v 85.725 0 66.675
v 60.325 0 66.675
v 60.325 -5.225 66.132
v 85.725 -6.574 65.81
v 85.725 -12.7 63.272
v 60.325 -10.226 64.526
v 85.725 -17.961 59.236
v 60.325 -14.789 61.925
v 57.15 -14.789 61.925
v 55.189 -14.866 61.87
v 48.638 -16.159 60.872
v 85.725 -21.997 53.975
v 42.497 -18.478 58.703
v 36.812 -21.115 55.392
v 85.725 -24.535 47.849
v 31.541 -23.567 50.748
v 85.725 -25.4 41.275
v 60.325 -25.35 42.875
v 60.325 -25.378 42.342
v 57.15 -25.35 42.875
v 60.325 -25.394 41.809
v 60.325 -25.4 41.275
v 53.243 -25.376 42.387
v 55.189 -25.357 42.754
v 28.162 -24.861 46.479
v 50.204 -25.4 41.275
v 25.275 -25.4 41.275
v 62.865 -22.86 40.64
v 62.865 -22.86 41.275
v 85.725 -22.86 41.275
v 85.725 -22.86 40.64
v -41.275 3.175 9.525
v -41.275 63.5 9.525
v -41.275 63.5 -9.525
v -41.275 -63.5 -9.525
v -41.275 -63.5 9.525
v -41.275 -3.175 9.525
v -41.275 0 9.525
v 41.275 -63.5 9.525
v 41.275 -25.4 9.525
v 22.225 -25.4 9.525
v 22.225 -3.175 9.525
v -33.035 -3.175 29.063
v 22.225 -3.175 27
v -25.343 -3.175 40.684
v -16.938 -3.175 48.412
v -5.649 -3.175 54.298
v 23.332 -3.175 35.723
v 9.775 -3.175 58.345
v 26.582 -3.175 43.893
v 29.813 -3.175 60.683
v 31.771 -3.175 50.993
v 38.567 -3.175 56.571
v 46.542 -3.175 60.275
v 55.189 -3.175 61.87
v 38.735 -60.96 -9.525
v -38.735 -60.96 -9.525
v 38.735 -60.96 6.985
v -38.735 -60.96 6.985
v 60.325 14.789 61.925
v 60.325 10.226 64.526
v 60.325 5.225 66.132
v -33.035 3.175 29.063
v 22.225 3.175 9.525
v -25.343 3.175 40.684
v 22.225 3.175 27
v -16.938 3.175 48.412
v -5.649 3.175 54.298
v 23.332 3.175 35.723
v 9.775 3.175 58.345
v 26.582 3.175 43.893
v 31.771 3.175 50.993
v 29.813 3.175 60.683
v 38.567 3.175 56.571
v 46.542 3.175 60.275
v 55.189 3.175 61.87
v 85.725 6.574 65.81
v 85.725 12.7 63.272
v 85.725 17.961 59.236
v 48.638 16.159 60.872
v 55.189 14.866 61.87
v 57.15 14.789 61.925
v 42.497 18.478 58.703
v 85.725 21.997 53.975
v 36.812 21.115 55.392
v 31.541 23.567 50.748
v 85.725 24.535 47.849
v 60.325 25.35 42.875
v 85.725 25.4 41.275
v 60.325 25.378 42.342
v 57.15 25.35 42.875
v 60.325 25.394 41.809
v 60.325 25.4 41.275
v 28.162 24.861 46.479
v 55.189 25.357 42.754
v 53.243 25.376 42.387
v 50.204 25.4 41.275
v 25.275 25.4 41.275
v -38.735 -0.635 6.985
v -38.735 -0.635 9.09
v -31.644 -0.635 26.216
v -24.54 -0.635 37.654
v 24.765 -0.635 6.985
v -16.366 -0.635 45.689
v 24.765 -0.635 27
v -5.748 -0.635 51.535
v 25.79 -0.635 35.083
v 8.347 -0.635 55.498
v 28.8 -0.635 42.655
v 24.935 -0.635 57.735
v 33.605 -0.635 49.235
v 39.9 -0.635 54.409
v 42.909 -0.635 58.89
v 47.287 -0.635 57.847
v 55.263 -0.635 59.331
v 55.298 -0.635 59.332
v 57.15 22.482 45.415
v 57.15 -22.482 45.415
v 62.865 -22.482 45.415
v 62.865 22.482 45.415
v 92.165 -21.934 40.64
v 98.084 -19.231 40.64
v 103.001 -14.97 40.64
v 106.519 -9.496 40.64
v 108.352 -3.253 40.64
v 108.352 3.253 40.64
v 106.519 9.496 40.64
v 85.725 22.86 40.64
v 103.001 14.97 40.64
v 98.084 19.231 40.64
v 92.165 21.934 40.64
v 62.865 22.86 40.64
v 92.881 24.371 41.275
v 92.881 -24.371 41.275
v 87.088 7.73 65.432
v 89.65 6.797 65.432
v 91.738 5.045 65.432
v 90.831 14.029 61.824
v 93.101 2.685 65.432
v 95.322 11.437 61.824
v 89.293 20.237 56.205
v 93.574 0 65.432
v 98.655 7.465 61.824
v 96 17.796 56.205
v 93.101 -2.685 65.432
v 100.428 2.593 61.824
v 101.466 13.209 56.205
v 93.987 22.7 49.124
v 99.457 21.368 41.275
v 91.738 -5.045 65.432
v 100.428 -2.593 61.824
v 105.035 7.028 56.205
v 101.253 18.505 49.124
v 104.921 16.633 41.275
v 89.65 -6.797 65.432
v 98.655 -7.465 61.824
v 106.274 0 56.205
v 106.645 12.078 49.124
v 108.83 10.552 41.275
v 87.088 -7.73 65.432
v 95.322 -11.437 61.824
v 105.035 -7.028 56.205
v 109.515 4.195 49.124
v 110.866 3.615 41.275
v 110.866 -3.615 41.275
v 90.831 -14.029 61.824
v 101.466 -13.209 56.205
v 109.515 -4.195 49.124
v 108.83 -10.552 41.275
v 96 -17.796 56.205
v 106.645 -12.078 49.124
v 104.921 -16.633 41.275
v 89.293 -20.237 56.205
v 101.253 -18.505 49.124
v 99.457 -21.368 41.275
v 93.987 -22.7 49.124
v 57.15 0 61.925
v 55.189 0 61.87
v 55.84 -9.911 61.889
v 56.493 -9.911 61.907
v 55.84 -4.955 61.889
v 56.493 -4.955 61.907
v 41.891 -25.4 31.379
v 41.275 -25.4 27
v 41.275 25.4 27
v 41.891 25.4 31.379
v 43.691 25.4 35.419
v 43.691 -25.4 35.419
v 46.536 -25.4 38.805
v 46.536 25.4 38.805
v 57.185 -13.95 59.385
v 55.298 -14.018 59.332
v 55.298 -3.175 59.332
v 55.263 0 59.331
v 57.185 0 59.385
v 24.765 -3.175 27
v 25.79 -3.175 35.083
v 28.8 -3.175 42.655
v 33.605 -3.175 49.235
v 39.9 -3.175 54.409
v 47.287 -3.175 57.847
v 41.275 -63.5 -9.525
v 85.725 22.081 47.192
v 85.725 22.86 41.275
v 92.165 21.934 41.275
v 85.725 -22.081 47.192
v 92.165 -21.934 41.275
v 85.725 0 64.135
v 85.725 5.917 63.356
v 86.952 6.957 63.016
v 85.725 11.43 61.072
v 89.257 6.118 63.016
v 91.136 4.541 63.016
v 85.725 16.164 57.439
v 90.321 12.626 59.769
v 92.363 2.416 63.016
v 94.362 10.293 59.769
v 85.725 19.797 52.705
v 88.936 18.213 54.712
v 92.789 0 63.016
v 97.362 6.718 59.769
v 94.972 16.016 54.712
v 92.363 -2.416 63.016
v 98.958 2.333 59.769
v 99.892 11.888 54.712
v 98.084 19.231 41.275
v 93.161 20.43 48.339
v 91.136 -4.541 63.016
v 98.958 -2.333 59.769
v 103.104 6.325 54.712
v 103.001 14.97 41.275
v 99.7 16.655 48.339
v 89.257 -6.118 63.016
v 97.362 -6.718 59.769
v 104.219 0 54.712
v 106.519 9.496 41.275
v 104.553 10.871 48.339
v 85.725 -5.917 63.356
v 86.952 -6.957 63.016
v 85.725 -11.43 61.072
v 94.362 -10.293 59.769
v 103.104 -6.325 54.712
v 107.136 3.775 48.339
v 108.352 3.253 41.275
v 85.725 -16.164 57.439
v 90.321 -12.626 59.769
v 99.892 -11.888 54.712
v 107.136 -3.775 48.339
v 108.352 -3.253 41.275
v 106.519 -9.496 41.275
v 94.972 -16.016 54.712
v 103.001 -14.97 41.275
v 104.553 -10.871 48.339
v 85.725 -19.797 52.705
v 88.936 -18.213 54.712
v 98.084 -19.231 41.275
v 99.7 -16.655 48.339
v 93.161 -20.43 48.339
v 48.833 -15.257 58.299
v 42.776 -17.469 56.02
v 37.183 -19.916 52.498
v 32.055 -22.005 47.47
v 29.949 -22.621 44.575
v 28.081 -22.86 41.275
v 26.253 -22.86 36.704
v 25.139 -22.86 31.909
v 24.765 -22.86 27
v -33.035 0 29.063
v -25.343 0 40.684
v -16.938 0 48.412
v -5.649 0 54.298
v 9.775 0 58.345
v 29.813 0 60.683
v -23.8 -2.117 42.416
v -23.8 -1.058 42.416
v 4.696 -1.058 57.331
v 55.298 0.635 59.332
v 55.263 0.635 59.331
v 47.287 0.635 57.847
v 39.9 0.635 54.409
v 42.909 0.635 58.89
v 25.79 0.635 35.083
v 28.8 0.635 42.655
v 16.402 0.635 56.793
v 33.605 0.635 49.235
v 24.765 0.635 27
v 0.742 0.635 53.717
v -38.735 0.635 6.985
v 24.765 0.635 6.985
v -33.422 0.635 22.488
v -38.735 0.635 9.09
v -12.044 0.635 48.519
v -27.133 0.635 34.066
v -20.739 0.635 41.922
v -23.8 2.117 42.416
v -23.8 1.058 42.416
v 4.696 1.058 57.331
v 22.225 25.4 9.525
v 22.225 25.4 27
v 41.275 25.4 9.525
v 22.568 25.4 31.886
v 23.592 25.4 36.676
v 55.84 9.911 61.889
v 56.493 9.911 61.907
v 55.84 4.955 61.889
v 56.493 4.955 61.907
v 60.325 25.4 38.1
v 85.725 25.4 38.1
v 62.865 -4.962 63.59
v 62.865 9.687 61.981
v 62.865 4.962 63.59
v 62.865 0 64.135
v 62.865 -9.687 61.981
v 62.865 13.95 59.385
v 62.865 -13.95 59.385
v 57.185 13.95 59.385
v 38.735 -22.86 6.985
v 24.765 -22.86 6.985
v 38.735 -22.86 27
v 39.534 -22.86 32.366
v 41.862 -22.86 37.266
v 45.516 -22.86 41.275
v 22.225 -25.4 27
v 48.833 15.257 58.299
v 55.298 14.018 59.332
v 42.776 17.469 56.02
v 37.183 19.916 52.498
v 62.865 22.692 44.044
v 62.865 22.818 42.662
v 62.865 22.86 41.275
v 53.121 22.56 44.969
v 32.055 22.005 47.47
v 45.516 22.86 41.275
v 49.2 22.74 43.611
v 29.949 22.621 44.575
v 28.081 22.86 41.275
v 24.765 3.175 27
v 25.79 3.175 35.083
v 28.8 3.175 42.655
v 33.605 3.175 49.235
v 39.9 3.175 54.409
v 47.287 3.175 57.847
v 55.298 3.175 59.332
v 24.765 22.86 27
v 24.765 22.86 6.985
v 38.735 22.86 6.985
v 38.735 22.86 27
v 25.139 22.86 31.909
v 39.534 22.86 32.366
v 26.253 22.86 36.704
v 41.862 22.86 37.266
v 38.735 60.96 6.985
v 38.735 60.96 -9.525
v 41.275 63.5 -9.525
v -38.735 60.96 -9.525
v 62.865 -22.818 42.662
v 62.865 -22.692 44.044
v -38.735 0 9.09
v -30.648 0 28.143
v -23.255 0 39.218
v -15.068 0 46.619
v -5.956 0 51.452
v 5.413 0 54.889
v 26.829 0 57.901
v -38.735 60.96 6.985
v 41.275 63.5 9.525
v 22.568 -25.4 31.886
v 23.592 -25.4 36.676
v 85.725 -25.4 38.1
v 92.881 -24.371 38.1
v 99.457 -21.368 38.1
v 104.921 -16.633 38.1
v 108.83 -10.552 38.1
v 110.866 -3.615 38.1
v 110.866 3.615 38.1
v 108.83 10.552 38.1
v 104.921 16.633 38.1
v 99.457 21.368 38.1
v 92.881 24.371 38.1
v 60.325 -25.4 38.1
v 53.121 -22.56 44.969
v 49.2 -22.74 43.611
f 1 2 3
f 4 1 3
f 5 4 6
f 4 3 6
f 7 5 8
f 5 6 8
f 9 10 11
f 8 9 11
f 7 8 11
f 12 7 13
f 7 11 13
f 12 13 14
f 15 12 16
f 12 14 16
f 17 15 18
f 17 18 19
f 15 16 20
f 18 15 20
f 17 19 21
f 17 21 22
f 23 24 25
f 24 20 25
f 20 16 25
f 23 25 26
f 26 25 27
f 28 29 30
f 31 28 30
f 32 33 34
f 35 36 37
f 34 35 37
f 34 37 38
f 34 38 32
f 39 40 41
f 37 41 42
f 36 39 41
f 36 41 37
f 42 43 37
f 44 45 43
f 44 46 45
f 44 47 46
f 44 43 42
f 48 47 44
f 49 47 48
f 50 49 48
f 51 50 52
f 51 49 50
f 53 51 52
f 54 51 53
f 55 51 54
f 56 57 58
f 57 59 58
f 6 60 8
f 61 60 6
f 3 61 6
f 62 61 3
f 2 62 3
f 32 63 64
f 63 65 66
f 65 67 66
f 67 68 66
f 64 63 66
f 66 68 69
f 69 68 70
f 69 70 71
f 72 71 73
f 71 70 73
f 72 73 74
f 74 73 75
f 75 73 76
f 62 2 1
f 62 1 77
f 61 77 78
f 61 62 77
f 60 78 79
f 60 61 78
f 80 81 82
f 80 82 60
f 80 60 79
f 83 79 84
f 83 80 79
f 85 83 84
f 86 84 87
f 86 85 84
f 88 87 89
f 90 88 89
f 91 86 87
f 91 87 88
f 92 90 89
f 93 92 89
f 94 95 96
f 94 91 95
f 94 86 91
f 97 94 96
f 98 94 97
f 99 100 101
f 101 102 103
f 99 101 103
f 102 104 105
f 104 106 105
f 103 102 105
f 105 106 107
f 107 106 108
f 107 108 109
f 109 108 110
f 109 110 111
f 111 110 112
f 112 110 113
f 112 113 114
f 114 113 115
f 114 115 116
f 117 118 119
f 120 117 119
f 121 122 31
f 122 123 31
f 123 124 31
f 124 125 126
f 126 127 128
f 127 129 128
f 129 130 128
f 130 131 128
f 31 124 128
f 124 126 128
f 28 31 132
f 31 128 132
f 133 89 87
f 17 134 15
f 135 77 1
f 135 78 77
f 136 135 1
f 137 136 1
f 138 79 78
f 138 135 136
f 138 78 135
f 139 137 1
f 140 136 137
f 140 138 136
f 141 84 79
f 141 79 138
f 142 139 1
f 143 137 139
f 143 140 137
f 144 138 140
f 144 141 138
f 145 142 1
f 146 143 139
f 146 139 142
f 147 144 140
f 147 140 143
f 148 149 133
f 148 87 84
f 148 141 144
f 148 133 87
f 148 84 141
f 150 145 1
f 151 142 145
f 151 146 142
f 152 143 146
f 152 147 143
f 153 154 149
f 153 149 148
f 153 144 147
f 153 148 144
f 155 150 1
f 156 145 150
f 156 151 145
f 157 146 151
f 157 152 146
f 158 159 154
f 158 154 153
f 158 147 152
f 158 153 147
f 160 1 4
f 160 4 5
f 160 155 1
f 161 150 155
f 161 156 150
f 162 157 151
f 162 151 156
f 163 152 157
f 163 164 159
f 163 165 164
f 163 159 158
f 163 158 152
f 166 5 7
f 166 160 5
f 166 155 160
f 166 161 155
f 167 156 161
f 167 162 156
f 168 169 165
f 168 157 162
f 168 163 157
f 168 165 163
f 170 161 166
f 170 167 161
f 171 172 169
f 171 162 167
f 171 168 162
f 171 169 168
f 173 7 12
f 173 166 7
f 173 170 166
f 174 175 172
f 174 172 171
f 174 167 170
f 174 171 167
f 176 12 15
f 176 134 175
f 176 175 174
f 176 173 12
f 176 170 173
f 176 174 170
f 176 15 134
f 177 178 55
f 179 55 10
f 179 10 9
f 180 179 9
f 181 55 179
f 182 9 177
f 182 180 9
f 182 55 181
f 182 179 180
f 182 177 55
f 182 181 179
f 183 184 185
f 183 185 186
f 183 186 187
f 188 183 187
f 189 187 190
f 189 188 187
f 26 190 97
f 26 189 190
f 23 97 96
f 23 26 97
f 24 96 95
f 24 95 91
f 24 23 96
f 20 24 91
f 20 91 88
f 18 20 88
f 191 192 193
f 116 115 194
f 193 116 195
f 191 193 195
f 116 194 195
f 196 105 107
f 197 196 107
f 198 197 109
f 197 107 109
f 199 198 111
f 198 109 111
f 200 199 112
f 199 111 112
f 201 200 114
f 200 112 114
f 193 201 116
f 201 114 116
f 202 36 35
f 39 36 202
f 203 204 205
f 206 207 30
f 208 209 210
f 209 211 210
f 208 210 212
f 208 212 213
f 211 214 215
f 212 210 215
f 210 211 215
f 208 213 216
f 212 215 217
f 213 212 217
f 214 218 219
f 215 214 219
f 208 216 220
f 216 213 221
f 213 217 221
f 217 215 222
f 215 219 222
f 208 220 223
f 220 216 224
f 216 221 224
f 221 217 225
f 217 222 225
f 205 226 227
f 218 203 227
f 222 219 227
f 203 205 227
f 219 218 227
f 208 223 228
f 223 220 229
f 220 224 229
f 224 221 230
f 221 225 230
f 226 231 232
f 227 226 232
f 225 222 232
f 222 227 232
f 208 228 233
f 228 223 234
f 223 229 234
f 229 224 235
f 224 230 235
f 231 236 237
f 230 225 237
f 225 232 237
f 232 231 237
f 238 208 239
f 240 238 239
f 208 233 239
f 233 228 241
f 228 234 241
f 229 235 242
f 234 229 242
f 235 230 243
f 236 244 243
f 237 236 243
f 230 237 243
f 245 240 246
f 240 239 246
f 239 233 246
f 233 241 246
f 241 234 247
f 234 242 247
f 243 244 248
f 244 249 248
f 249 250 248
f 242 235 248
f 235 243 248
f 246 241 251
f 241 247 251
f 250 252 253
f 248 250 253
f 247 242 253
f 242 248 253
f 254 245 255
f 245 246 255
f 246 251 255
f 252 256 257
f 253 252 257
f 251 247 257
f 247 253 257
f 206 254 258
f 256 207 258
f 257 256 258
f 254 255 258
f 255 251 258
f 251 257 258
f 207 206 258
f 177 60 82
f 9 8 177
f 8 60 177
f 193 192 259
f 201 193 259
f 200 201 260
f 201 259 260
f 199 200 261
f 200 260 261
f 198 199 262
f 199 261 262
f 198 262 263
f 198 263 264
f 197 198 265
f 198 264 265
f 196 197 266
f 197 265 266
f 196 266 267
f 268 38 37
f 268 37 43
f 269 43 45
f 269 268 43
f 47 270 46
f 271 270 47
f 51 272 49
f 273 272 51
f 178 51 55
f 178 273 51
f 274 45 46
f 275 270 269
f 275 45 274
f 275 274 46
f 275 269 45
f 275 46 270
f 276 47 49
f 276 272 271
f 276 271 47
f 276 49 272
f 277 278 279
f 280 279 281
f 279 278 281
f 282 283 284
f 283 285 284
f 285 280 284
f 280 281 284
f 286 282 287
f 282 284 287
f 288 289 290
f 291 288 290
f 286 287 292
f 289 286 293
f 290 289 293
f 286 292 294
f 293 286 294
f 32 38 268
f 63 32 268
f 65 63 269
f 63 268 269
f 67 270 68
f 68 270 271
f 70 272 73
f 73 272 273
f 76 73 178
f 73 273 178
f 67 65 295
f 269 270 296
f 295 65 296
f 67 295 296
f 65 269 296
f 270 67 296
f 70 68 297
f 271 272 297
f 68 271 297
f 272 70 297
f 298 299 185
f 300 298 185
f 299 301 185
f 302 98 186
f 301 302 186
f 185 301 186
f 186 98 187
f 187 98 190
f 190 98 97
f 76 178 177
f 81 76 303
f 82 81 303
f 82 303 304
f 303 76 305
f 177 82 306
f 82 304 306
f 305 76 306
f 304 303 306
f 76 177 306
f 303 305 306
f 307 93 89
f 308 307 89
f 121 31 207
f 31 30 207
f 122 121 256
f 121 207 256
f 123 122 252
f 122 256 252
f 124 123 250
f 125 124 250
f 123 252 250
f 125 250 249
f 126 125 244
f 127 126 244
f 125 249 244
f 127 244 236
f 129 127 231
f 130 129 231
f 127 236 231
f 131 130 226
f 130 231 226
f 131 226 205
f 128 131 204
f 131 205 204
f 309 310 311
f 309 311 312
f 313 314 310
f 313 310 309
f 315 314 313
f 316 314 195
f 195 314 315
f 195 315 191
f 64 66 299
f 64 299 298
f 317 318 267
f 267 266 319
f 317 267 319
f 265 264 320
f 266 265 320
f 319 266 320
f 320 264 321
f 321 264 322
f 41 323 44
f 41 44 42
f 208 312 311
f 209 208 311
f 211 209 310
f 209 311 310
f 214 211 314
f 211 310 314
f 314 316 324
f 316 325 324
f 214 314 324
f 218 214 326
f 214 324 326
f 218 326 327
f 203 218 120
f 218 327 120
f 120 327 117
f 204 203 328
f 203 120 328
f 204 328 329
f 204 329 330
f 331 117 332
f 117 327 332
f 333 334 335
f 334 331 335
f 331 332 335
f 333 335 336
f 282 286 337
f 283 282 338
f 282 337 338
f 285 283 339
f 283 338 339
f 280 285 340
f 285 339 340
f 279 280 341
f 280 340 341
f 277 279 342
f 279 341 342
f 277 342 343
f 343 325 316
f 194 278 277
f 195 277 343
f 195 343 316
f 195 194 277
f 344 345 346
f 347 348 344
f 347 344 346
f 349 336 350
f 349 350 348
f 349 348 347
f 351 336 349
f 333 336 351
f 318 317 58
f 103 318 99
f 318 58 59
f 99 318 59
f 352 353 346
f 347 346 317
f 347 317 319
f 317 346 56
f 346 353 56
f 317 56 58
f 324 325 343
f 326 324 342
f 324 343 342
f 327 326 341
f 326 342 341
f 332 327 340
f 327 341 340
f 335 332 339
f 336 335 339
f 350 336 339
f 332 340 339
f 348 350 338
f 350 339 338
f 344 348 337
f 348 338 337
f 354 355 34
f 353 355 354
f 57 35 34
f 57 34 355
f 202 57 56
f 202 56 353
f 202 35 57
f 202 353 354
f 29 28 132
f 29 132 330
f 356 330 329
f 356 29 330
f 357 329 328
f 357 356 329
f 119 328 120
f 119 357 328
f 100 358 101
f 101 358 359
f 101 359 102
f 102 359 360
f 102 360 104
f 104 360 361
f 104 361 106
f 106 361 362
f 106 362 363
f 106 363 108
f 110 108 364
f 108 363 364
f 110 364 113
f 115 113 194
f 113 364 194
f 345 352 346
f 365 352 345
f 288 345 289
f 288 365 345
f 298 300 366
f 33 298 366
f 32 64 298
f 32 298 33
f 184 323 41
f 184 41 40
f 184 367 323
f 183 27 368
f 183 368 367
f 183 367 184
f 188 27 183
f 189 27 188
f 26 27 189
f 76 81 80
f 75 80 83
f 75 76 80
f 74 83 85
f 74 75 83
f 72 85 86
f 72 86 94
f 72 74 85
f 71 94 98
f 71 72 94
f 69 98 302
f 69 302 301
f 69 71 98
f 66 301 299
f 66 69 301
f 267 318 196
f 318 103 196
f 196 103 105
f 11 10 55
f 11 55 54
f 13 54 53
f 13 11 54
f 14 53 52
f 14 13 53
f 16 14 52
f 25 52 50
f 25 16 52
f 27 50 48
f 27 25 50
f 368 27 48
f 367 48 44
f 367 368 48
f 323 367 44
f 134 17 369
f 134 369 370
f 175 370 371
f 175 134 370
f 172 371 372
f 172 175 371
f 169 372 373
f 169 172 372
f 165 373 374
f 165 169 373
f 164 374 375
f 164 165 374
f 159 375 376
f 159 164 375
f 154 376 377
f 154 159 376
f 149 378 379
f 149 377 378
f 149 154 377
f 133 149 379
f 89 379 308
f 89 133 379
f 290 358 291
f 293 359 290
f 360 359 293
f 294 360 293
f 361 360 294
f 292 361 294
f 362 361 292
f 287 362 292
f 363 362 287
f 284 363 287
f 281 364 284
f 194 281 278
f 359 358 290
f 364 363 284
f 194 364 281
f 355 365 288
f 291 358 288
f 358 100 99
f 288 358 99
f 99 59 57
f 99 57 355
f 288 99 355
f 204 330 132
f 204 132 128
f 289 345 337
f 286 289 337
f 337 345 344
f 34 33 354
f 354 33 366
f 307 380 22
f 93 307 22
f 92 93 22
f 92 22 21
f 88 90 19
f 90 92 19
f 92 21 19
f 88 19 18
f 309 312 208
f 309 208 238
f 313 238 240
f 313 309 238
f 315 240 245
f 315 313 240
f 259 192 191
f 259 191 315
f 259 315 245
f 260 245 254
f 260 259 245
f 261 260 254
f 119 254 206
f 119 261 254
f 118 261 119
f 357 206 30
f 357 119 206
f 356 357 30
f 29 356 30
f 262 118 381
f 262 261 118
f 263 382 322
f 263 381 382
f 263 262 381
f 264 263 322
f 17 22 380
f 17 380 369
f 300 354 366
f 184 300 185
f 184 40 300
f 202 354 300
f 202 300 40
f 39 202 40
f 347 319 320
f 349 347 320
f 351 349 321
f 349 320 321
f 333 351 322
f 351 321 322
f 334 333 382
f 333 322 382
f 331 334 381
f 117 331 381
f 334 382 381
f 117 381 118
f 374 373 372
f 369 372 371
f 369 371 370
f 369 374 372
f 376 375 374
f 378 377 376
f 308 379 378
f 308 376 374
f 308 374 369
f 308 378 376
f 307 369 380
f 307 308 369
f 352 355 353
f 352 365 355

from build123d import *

# Parameters (mm, degrees)
F1_DEPTH     = 63.5
F0_W         = 25.4
F0_H         = 19.05
F0_H_2       = 4.7752
F0_H_3       = 4.7498
F2_DEPTH     = 25.4
F3_DEPTH     = 3.175
F5_T1_DEPTH  = 88.9
F5_T4_ANGLE  = 180
F6_T         = 2.54
F6_T3_DEPTH  = 24.13
F6_T5_DEPTH  = 27.305
F6_T7_DEPTH  = 68.58
F6_T9_DEPTH  = 27.305
F6_T11_DEPTH = 22.5552
F6_T13_DEPTH = 55.7790871697
F6_T15_DEPTH = 34.6589952471
F6_T18_ANGLE = 86.7817435726
F6_T20_ANGLE = 86.7817435726


# Not quite as in the source:
# - a fillet or chamfer that OpenCascade refuses, or shapes differently, is made with other operations: its cross-section is extruded or revolved along the edge and cut away or added
# - a shell that OpenCascade refuses in one call is made with other operations: the cavity is built on its own and cut out


with BuildPart() as f1:
    # F0 (on Front) → F1 (new body, symmetric)
    with BuildSketch(Plane.XZ):
        Polygon((41.275, -9.525), (41.275, 9.525), (22.225, 9.525), (-41.275, 9.525), (-41.275, -9.525), align=None)
    extrude(amount=F1_DEPTH, both=True)

    # F0 (on Front) → F2 (join, symmetric)
    with BuildSketch(Plane.XZ):
        with BuildLine():
            Line((22.225, 9.525), (41.275, 9.525))
            Line((41.275, 9.525), (41.275, 27.0002))
            ThreePointArc((41.275, 27.0002), (45.9246798487, 38.2255201513), (57.15, 42.8752))
            Line((57.15, 42.8752), (60.325, 42.8752))
            Line((60.325, 42.8752), (60.325, 61.9252))
            Line((60.325, 61.9252), (57.15, 61.9252))
            add(Edge.make_bspline(
                [(55.1893230691, 61.8701207193), (55.8379631981, 61.8888818572), (56.4915059272, 61.9072303668), (57.15, 61.9252)],
                knots=[110.4053566359, 110.4053566359, 110.4053566359, 110.4053566359, 111.5045361635, 111.5045361635, 111.5045361635, 111.5045361635], degree=3))
            ThreePointArc((55.1893230691, 61.8701207193), (31.7705568736, 50.9926882326), (22.225, 27.0002))
            Line((22.225, 27.0002), (22.225, 9.525))
        make_face()
        with Locations((73.025, 52.4002)):
            Rectangle(F0_W, F0_H)
        with Locations((73.025, 40.4876)):
            Rectangle(F0_W, F0_H_2)
        with Locations((73.025, 64.3001)):
            Rectangle(F0_W, F0_H_3)
    extrude(amount=F2_DEPTH, both=True)

    # F0 (on Front) → F3 (join, symmetric)
    with BuildSketch(Plane.XZ):
        with BuildLine():
            Line((-41.275, 9.525), (22.225, 9.525))
            Line((22.225, 9.525), (22.225, 27.0002))
            ThreePointArc((22.225, 27.0002), (31.7705568736, 50.9926882326), (55.1893230691, 61.8701207193))
            add(Edge.make_bspline(
                [(-41.275, 9.525), (-25.6521962788, 53.9382967597), (-9.9623131958, 59.9856877717), (55.1893230691, 61.8701207193)],
                knots=[0, 0, 0, 0, 110.4053566359, 110.4053566359, 110.4053566359, 110.4053566359], degree=3))
        make_face()
    extrude(amount=F3_DEPTH, both=True)

    # F0 (on Front) → F4 (revolve)
    with BuildSketch(Plane.XZ):
        Polygon((85.725, 61.9252), (85.725, 42.8752), (85.725, 38.1), (111.125, 38.1), (111.125, 66.675), (85.725, 66.675), align=None)
    revolve(axis=Axis((85.725, 0, 52.3875), (0, 0, 1)))

    # F5: fillet of radius 25.4 on 1 edges, made by hand

    # F5_s2 → F5_t1 (cut)
    with BuildSketch(Plane.YZ.offset(-3.175)):
        with BuildLine():
            ThreePointArc((0, 66.675), (17.9605122421, 59.2355122421), (25.4, 41.275))
            Line((25.4, 41.275), (25.4, 66.675))
            Line((25.4, 66.675), (0, 66.675))
        make_face()
        with BuildLine():
            ThreePointArc((0, 66.675), (-17.9605122421, 59.2355122421), (-25.4, 41.275))
            Line((-25.4, 41.275), (-25.4, 66.675))
            Line((-25.4, 66.675), (0, 66.675))
        make_face()
    extrude(amount=F5_T1_DEPTH, mode=Mode.SUBTRACT)

    # F5_s3 → F5_t4 (revolve, cut)
    with BuildSketch(Plane.YZ.offset(85.725)):
        with BuildLine():
            ThreePointArc((0, 66.675), (17.9605122421, 59.2355122421), (25.4, 41.275))
            Line((25.4, 41.275), (25.4, 66.675))
            Line((25.4, 66.675), (0, 66.675))
        make_face()
    revolve(axis=Axis((85.725, 0, 66.675), (0, 0, -1)), revolution_arc=F5_T4_ANGLE, mode=Mode.SUBTRACT)

    # F6: shell of thickness 2.54, made by hand


with BuildPart() as f6_core1:
    # F6_t2: copy of F1
    add(f1.part)

    # the walls: a layer under each face that stays
    f6_faces = [f6_core1.faces().sort_by_distance(p)[0] for p in [
        (41.275, 0, 8.7376),
        (0, 63.5, 0),
        (0, 33.3375, 9.525),
        (36.214543408, 25.4, 25.4),
        (45.9246798487, 0, 38.2255201513),
        (36.214543408, -25.4, 25.4),
        (0, -33.3375, 9.525),
        (0, -63.5, 0),
        (-41.275, 0, 0),
        (22.225, 14.2875, 18.2626),
        (6.9571615345, 3.175, 35.6975603597),
        (31.7705568736, 14.2875, 50.9926882326),
        (55.5002346295, 17.9605122421, 59.2355122421),
        (55.5002346295, -17.9605122421, 59.2355122421),
        (58.7375, 0, 42.8752),
        (31.7705568736, -14.2875, 50.9926882326),
        (22.225, -14.2875, 18.2626),
        (6.9571615345, -3.175, 35.6975603597),
        (-11.6161506693, 1.5875, 51.6458842892),
        (-11.6161506693, -1.5875, 51.6458842892),
        (56.1659663056, 7.4330512334, 61.8979571739),
        (60.325, 0, 64.3001),
        (58.7375, 0, 61.9252),
        (60.325, 0, 40.4876),
        (73.025, 25.4, 39.6875),
        (103.6855122422, -1e-10, 59.2355122421),
        (56.1659663056, -7.4330512334, 61.8979571739),
        (73.025, -25.4, 39.6875),
        (85.725, 0, 38.1),
        (111.125, 0, 39.6875),
    ]]
    thicken(f6_faces, amount=-F6_T, mode=Mode.SUBTRACT)

    # F6_s4 → F6_t3 (cut)
    with BuildSketch(Plane.YZ.offset(19.685)):
        Polygon((25.4254, 9.5504), (25.4, 6.985), (22.86, 6.985), (22.86, 9.525), align=None)
        Polygon((-25.4254, 9.5504), (-22.86, 9.525), (-22.86, 6.985), (-25.4, 6.985), align=None)
    extrude(amount=F6_T3_DEPTH, mode=Mode.SUBTRACT)

    # F6_s6 → F6_t5 (cut)
    with BuildSketch(Plane.XZ.offset(-27.94)):
        Polygon((22.1996, 9.5504), (22.225, 6.985), (24.765, 6.985), (24.765, 9.525), align=None)
    extrude(amount=F6_T5_DEPTH, mode=Mode.SUBTRACT)

    # F6_s8 → F6_t7 (cut)
    with BuildSketch(Plane.YZ.offset(-43.815)):
        Polygon((3.2004, 9.5504), (3.175, 6.985), (0.635, 6.985), (0.635, 9.525), align=None)
        Polygon((-3.2004, 9.5504), (-3.175, 6.985), (-0.635, 6.985), (-0.635, 9.525), align=None)
    extrude(amount=F6_T7_DEPTH, mode=Mode.SUBTRACT)

    # F6_s10 → F6_t9 (cut)
    with BuildSketch(Plane.XZ.offset(0.635)):
        Polygon((22.1996, 9.5504), (22.225, 6.985), (24.765, 6.985), (24.765, 9.525), align=None)
    extrude(amount=F6_T9_DEPTH, mode=Mode.SUBTRACT)

    # F6_s12 → F6_t11 (cut)
    with BuildSketch(Plane.XY.offset(6.985)):
        Polygon((22.1996, 3.2004), (24.765, 3.175), (24.765, 0.635), (22.225, 0.635), align=None)
        Polygon((22.1996, -3.2004), (24.765, -3.175), (24.765, -0.635), (22.225, -0.635), align=None)
    extrude(amount=F6_T11_DEPTH, mode=Mode.SUBTRACT)

    # F6_s14 → F6_t13 (cut)
    with BuildSketch(Plane.XZ.offset(-27.8895435848)):
        Polygon((60.2996, 42.8498), (60.325, 45.4152), (62.865, 45.4152), (62.865, 42.8752), align=None)
    extrude(amount=F6_T13_DEPTH, mode=Mode.SUBTRACT)

    # F6_s16 → F6_t15 (cut)
    with BuildSketch(Plane.XZ.offset(-17.3294976236)):
        Polygon((60.2996, 61.9506), (62.865, 61.9252), (62.865, 59.3852), (60.325, 59.3852), align=None)
    extrude(amount=F6_T15_DEPTH, mode=Mode.SUBTRACT)

    # F6_s17 → F6_t18 (revolve, cut)
    with BuildSketch(Plane.XY.offset(27.0002)):
        Polygon((22.1996, 3.2004), (22.225, 0.635), (24.765, 0.635), (24.765, 3.175), align=None)
    revolve(axis=Axis((57.15, 3.175, 27.0002), (0, 1, 0)), revolution_arc=F6_T18_ANGLE, mode=Mode.SUBTRACT)

    # F6_s19 → F6_t20 (revolve, cut)
    with BuildSketch(Plane.XY.offset(27.0002)):
        Polygon((22.1996, -3.2004), (24.765, -3.175), (24.765, -0.635), (22.225, -0.635), align=None)
    revolve(axis=Axis((57.15, -3.175, 27.0002), (0, 1, 0)), revolution_arc=F6_T20_ANGLE, mode=Mode.SUBTRACT)


with BuildPart() as f1_1:
    add(f1.part)

    # what is left inside the walls is the cavity
    f6_cavity = [f6_core1.part.solids().sort_by_distance(p)[0] for p in [
        (0, 20.32, -9.4996),
    ]]
    add(f6_cavity, mode=Mode.SUBTRACT)


solid = f1_1.part
